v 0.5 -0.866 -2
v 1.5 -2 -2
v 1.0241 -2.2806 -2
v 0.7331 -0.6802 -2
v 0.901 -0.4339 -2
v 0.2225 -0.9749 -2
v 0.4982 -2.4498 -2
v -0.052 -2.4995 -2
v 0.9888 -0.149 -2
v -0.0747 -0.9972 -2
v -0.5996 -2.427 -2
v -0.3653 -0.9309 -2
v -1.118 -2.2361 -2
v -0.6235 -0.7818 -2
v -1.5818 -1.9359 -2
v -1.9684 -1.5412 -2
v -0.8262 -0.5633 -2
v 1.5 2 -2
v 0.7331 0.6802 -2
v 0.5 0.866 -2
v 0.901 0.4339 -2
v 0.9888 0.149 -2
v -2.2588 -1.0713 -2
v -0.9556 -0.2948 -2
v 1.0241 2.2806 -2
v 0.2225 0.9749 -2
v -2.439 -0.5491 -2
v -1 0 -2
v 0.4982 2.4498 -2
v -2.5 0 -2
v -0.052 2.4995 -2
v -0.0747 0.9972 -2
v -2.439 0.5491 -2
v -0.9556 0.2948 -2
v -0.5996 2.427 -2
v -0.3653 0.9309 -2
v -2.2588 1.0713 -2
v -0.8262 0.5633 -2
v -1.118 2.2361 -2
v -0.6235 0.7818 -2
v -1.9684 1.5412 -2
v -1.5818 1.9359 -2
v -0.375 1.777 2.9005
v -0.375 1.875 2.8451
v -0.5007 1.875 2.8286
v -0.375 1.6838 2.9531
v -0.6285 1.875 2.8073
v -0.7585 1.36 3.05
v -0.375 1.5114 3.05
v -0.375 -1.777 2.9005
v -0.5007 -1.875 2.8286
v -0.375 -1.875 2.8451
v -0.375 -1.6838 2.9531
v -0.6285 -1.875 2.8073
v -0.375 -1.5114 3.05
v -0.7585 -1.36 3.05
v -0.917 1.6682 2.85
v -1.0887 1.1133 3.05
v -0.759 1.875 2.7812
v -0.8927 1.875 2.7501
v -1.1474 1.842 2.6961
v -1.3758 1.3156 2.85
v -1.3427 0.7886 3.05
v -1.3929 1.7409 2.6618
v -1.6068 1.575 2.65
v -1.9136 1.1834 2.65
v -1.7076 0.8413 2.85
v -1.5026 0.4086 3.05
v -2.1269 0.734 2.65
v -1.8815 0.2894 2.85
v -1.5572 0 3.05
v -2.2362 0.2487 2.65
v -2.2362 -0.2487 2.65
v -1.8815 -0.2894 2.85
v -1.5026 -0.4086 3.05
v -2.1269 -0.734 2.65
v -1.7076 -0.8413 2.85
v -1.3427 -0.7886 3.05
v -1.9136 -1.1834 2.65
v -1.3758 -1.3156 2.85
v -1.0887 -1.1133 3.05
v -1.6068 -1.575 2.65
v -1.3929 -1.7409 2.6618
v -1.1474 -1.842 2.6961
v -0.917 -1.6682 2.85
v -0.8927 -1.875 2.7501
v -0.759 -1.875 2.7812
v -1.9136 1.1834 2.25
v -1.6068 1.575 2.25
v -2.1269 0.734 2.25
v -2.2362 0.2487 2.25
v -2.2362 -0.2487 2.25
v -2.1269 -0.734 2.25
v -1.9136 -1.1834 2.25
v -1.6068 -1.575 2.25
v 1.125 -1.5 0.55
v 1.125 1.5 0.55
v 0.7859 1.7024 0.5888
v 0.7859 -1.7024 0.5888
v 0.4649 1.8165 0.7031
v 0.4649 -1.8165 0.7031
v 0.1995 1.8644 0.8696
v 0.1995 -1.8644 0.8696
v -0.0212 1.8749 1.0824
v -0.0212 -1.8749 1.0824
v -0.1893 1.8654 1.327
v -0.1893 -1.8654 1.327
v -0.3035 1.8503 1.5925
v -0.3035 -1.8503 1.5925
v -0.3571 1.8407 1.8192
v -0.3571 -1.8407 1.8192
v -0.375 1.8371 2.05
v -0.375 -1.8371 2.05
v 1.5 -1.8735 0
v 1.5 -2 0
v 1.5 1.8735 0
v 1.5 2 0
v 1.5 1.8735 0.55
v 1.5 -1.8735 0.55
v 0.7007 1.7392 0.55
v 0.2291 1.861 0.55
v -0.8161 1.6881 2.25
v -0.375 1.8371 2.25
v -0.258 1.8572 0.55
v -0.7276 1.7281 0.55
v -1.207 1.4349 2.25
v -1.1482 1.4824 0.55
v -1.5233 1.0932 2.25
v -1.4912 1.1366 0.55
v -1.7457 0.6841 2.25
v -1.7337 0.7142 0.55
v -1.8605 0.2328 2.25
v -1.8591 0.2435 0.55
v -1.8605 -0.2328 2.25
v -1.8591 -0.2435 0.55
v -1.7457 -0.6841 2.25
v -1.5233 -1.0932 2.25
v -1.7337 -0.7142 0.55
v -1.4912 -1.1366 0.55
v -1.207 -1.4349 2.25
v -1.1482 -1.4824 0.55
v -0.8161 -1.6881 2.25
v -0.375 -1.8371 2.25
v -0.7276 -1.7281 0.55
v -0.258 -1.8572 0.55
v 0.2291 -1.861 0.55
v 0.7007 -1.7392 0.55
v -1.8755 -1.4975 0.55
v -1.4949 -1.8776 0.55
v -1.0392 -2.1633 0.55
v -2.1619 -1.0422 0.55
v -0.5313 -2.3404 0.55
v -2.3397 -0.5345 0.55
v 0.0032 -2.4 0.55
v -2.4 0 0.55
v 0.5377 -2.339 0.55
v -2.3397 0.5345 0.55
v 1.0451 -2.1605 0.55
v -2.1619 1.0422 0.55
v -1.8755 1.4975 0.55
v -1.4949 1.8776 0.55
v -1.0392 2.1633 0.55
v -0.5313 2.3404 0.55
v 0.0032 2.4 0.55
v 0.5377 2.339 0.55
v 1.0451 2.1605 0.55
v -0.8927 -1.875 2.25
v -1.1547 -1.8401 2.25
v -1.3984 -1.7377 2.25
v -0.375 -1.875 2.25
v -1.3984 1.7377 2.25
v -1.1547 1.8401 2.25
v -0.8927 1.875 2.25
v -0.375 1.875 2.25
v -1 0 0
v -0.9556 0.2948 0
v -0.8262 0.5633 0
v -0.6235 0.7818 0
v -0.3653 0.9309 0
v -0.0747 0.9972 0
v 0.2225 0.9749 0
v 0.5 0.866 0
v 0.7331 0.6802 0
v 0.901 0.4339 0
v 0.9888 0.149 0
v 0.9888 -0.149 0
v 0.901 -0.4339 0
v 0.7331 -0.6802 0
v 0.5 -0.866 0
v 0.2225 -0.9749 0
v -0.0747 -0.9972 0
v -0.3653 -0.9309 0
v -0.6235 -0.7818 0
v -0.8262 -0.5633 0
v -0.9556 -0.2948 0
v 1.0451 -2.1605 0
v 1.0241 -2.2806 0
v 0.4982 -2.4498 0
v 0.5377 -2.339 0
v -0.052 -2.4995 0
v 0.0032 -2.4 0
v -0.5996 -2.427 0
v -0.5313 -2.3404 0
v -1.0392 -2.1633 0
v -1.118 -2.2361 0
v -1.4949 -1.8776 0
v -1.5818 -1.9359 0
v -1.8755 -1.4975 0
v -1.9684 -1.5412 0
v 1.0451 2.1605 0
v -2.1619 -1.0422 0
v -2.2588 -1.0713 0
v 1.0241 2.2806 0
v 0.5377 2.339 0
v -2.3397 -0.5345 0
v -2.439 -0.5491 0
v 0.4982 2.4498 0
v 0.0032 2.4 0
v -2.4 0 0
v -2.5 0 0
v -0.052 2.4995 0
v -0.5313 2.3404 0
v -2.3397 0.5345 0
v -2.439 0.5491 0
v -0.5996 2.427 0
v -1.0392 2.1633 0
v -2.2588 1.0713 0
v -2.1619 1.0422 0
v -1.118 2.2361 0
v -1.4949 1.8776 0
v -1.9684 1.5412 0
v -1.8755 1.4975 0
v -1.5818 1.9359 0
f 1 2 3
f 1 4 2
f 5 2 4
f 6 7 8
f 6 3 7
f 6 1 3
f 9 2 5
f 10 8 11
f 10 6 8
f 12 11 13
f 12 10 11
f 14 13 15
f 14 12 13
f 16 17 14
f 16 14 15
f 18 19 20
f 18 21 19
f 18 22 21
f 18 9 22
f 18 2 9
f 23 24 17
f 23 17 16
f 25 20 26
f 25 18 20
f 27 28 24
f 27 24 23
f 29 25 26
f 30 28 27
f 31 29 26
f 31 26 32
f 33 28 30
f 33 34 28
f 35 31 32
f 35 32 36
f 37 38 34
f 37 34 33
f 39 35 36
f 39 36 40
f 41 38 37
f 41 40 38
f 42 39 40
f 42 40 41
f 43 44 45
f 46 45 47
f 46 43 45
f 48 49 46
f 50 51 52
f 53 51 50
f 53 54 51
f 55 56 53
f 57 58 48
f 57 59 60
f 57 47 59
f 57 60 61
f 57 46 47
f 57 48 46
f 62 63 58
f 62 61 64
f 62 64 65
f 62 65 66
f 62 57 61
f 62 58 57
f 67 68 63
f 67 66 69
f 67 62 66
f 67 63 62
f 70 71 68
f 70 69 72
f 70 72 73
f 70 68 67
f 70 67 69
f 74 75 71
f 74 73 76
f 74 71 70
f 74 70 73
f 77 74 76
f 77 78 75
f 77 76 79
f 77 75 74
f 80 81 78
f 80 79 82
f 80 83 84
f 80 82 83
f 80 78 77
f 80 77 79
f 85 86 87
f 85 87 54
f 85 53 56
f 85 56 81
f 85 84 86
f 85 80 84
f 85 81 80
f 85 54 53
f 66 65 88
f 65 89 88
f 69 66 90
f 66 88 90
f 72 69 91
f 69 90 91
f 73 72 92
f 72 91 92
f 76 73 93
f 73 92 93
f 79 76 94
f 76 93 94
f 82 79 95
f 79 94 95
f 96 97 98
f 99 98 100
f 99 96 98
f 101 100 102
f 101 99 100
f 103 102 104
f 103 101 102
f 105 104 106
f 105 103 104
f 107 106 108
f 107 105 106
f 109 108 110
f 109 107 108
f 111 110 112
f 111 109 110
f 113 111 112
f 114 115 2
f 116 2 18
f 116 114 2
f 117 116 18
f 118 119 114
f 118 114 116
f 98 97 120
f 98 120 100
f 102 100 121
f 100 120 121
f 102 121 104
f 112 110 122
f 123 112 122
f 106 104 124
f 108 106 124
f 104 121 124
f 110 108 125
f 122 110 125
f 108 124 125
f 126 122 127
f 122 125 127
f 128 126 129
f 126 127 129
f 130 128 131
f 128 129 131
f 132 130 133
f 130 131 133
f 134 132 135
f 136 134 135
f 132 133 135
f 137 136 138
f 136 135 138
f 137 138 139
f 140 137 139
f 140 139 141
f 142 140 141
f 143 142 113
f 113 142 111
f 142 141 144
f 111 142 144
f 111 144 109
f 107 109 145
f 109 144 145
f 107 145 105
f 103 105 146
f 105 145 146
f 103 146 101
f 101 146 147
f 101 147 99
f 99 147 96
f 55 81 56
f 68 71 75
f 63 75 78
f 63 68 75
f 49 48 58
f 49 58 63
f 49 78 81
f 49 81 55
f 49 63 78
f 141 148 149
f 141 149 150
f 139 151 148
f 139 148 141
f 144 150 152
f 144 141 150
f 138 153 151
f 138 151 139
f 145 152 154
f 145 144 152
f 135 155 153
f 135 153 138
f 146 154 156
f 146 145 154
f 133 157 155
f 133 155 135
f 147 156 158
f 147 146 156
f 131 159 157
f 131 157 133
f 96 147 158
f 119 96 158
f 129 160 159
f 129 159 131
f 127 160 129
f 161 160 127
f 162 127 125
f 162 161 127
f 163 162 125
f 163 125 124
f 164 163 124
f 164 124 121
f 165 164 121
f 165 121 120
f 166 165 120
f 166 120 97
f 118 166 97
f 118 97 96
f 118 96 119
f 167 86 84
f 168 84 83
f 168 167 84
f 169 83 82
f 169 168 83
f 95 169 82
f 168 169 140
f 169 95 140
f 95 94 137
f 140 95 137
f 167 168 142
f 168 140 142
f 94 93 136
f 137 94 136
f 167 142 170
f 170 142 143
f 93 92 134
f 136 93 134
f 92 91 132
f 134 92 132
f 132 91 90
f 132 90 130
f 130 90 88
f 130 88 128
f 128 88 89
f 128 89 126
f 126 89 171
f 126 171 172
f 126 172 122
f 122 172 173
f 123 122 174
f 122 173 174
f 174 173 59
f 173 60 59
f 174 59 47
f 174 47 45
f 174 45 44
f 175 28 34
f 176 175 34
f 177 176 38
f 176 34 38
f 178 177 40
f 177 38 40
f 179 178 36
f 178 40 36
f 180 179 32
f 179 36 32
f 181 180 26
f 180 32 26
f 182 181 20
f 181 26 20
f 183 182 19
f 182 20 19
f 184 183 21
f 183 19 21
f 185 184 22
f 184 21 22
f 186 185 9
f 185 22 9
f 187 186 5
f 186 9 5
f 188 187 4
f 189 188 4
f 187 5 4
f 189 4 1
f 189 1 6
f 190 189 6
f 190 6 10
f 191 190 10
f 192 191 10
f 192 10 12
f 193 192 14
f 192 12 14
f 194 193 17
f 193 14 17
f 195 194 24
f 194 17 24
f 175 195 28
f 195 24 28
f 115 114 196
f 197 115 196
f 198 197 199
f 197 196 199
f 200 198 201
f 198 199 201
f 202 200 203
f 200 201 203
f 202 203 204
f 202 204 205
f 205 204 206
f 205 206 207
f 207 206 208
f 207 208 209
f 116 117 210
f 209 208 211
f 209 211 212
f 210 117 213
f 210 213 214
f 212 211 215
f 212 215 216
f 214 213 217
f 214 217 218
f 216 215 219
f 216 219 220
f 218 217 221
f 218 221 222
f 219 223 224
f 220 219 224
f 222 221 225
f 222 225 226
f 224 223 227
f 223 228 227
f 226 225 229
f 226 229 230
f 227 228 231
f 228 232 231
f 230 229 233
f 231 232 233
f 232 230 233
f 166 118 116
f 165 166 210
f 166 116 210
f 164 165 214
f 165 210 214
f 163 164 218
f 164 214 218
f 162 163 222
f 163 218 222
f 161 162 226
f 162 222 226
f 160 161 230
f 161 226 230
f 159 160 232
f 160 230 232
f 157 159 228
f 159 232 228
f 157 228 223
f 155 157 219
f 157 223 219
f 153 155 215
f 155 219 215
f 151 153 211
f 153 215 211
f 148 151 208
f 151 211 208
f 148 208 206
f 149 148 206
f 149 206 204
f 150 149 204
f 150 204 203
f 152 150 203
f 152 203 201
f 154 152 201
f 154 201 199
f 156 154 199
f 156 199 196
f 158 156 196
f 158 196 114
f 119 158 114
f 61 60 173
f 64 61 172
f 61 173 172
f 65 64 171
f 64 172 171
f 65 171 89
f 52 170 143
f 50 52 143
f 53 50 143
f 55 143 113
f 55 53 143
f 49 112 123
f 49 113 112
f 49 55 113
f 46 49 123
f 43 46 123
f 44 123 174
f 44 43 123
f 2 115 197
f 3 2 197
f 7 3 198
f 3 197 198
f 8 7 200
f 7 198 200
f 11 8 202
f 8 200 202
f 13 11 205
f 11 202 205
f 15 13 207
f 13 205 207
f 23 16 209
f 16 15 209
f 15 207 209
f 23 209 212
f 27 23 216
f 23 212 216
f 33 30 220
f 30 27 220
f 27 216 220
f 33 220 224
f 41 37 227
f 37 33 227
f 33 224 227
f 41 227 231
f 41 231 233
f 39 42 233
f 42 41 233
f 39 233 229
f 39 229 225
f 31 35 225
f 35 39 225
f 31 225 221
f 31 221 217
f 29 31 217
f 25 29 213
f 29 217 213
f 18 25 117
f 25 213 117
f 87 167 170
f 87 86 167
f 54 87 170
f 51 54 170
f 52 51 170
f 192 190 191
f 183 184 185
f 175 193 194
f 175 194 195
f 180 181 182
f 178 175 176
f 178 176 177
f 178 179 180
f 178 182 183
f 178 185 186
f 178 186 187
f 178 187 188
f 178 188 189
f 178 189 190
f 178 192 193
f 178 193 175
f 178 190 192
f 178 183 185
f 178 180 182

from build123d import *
from OCP.BRepFilletAPI import BRepFilletAPI_MakeChamfer

# Parameters (mm, degrees)
SKETCH1_R               = 2.4
BOSS_EXTRUDE1_DEPTH     = 0.55
SKETCH2_R               = 1.875
BOSS_EXTRUDE2_DEPTH     = 1.7
SKETCH3_R               = 2.5
BOSS_EXTRUDE3_DEPTH     = 2
SKETCH4_R               = 2.25
BOSS_EXTRUDE4_DEPTH     = 0.8
CUT_EXTRUDE1_REACH      = 8.165
SKETCH5_W               = 0.75
SKETCH5_H               = 6.07376998
CHAMFER1_SIZE           = 0.4
CHAMFER1_SIZE2          = 0.692820323
SKETCH6_W               = 6.999273813
SKETCH6_H               = 5.334981493
SKETCH6_W_2             = 6.558585844
SKETCH6_H_2             = 3.75
CUT_EXTRUDE3_DEPTH      = 2
FILLET2_R               = 1
SKETCH7_R               = 1
CUT_EXTRUDE4_DEPTH      = 2
CUT_EXTRUDE5_DEPTH      = 3
CUT_EXTRUDE5_DEPTH_BACK = 10
SKETCH9_W               = 3.309409713
SKETCH9_H               = 2.920914296
FILLET3_R               = 1.5
SKETCH10_W              = 2.950077704
SKETCH10_H              = 6.497759574
CUT_EXTRUDE6_DEPTH      = 10


with BuildPart() as part:
    # Sketch1 → Boss-Extrude1 (new body)
    with BuildSketch(Plane.XY):
        Circle(SKETCH1_R)
    extrude(amount=BOSS_EXTRUDE1_DEPTH)

    # Sketch2 → Boss-Extrude2 (add)
    with BuildSketch(Plane.XY.offset(0.55)):
        Circle(SKETCH2_R)
    extrude(amount=BOSS_EXTRUDE2_DEPTH)

    # Sketch3 → Boss-Extrude3 (add)
    with BuildSketch(Plane(origin=(0, 0, 0), x_dir=(-1, 0, 0), z_dir=(0, 0, -1))):
        Circle(SKETCH3_R)
    extrude(amount=BOSS_EXTRUDE3_DEPTH)

    # Sketch4 → Boss-Extrude4 (add)
    with BuildSketch(Plane.XY.offset(2.25)):
        Circle(SKETCH4_R)
    extrude(amount=BOSS_EXTRUDE4_DEPTH)

    # Cut-Extrude1: up to this face of the body (flat: up to its plane)
    cut_extrude1_end = Plane(part.part.faces().sort_by_distance((-2.332117749, 0, 0.55))[0])
    # Sketch5 → Cut-Extrude1 (cut, up to the picked face)
    with BuildSketch(Plane.XY.offset(3.05), mode=Mode.PRIVATE) as cut_extrude1_sk1:
        Rectangle(SKETCH5_W, SKETCH5_H)
    cut_extrude1_tool1 = split(extrude(cut_extrude1_sk1.sketch, amount=-CUT_EXTRUDE1_REACH, mode=Mode.PRIVATE), bisect_by=cut_extrude1_end, keep=Keep.BOTH, mode=Mode.PRIVATE)
    add(cut_extrude1_tool1.solids().sort_by(Axis((0, 0, 3.05), (0, 0, -1)))[0], mode=Mode.SUBTRACT)

    # Chamfer1: one chamfer whose edges measure the first distance from different faces: ONE call of the kernel's chamfer builder (chamfer() names one face for all edges)
    chamfer1_edges_1 = [part.edges().sort_by_distance(p)[0] for p in [
        (-2.25, 0, 3.05),
    ]]
    chamfer1_side_1 = [part.faces().sort_by_distance(p)[0] for p in [
        (-2.25, 0, 2.65),
    ]]
    chamfer1_edges_2 = [part.edges().sort_by_distance(p)[0] for p in [
        (2.25, 0, 3.05),
    ]]
    chamfer1_side_2 = [part.faces().sort_by_distance(p)[0] for p in [
        (2.25, 0, 2.65),
    ]]
    chamfer1 = BRepFilletAPI_MakeChamfer(part.part.solid().wrapped)
    for e in chamfer1_edges_1:
        chamfer1.Add(CHAMFER1_SIZE, CHAMFER1_SIZE2, e.wrapped, chamfer1_side_1[0].wrapped)  # the first distance lies on this face
    for e in chamfer1_edges_2:
        chamfer1.Add(CHAMFER1_SIZE, CHAMFER1_SIZE2, e.wrapped, chamfer1_side_2[0].wrapped)  # the first distance lies on this face
    add(Compound.cast(chamfer1.Shape()), mode=Mode.REPLACE)

    # Sketch6 → Cut-Extrude3 (cut)
    with BuildSketch(Plane.XY.offset(3.05)):
        with Locations((0.047792, -0.043471688)):
            Rectangle(SKETCH6_W, SKETCH6_H)
        Rectangle(SKETCH6_W_2, SKETCH6_H_2, mode=Mode.SUBTRACT)
    extrude(amount=-CUT_EXTRUDE3_DEPTH, mode=Mode.SUBTRACT)

    # Fillet2
    fillet2_edges = [part.edges().sort_by_distance(p)[0] for p in [
        (-1.243734296, 1.875, 2.45),
        (1.243734296, 1.875, 2.45),
        (-1.243734296, -1.875, 2.45),
        (1.243734296, -1.875, 2.45),
    ]]
    fillet(fillet2_edges, radius=FILLET2_R)

    # Sketch7 → Cut-Extrude4 (cut)
    with BuildSketch(Plane(origin=(0, 0, -2), x_dir=(-1, 0, 0), z_dir=(0, 0, -1))):
        Circle(SKETCH7_R)
    extrude(amount=-CUT_EXTRUDE4_DEPTH, mode=Mode.SUBTRACT)

    # Sketch9 → Cut-Extrude5 (cut, two sides: drawn at the far end of the back side and taken through both)
    with BuildSketch(Plane(origin=(0, 0, 0), x_dir=(1, 0, 0), z_dir=(0, 1, 0)).offset(-CUT_EXTRUDE5_DEPTH_BACK)):
        with Locations((1.654704857, -2.010457148)):
            Rectangle(SKETCH9_W, SKETCH9_H)
    extrude(amount=CUT_EXTRUDE5_DEPTH + CUT_EXTRUDE5_DEPTH_BACK, mode=Mode.SUBTRACT)

    # Fillet3
    fillet3_edges = [part.edges().sort_by_distance(p)[0] for p in [
        (-0.375, 0, 0.55),
    ]]
    fillet(fillet3_edges, radius=FILLET3_R)

    # Sketch10 → Cut-Extrude6 (cut)
    with BuildSketch(Plane.XY.offset(0.55)):
        with Locations((2.975038852, 0.087286089)):
            Rectangle(SKETCH10_W, SKETCH10_H)
    extrude(amount=-CUT_EXTRUDE6_DEPTH, mode=Mode.SUBTRACT)


solid = part.part
